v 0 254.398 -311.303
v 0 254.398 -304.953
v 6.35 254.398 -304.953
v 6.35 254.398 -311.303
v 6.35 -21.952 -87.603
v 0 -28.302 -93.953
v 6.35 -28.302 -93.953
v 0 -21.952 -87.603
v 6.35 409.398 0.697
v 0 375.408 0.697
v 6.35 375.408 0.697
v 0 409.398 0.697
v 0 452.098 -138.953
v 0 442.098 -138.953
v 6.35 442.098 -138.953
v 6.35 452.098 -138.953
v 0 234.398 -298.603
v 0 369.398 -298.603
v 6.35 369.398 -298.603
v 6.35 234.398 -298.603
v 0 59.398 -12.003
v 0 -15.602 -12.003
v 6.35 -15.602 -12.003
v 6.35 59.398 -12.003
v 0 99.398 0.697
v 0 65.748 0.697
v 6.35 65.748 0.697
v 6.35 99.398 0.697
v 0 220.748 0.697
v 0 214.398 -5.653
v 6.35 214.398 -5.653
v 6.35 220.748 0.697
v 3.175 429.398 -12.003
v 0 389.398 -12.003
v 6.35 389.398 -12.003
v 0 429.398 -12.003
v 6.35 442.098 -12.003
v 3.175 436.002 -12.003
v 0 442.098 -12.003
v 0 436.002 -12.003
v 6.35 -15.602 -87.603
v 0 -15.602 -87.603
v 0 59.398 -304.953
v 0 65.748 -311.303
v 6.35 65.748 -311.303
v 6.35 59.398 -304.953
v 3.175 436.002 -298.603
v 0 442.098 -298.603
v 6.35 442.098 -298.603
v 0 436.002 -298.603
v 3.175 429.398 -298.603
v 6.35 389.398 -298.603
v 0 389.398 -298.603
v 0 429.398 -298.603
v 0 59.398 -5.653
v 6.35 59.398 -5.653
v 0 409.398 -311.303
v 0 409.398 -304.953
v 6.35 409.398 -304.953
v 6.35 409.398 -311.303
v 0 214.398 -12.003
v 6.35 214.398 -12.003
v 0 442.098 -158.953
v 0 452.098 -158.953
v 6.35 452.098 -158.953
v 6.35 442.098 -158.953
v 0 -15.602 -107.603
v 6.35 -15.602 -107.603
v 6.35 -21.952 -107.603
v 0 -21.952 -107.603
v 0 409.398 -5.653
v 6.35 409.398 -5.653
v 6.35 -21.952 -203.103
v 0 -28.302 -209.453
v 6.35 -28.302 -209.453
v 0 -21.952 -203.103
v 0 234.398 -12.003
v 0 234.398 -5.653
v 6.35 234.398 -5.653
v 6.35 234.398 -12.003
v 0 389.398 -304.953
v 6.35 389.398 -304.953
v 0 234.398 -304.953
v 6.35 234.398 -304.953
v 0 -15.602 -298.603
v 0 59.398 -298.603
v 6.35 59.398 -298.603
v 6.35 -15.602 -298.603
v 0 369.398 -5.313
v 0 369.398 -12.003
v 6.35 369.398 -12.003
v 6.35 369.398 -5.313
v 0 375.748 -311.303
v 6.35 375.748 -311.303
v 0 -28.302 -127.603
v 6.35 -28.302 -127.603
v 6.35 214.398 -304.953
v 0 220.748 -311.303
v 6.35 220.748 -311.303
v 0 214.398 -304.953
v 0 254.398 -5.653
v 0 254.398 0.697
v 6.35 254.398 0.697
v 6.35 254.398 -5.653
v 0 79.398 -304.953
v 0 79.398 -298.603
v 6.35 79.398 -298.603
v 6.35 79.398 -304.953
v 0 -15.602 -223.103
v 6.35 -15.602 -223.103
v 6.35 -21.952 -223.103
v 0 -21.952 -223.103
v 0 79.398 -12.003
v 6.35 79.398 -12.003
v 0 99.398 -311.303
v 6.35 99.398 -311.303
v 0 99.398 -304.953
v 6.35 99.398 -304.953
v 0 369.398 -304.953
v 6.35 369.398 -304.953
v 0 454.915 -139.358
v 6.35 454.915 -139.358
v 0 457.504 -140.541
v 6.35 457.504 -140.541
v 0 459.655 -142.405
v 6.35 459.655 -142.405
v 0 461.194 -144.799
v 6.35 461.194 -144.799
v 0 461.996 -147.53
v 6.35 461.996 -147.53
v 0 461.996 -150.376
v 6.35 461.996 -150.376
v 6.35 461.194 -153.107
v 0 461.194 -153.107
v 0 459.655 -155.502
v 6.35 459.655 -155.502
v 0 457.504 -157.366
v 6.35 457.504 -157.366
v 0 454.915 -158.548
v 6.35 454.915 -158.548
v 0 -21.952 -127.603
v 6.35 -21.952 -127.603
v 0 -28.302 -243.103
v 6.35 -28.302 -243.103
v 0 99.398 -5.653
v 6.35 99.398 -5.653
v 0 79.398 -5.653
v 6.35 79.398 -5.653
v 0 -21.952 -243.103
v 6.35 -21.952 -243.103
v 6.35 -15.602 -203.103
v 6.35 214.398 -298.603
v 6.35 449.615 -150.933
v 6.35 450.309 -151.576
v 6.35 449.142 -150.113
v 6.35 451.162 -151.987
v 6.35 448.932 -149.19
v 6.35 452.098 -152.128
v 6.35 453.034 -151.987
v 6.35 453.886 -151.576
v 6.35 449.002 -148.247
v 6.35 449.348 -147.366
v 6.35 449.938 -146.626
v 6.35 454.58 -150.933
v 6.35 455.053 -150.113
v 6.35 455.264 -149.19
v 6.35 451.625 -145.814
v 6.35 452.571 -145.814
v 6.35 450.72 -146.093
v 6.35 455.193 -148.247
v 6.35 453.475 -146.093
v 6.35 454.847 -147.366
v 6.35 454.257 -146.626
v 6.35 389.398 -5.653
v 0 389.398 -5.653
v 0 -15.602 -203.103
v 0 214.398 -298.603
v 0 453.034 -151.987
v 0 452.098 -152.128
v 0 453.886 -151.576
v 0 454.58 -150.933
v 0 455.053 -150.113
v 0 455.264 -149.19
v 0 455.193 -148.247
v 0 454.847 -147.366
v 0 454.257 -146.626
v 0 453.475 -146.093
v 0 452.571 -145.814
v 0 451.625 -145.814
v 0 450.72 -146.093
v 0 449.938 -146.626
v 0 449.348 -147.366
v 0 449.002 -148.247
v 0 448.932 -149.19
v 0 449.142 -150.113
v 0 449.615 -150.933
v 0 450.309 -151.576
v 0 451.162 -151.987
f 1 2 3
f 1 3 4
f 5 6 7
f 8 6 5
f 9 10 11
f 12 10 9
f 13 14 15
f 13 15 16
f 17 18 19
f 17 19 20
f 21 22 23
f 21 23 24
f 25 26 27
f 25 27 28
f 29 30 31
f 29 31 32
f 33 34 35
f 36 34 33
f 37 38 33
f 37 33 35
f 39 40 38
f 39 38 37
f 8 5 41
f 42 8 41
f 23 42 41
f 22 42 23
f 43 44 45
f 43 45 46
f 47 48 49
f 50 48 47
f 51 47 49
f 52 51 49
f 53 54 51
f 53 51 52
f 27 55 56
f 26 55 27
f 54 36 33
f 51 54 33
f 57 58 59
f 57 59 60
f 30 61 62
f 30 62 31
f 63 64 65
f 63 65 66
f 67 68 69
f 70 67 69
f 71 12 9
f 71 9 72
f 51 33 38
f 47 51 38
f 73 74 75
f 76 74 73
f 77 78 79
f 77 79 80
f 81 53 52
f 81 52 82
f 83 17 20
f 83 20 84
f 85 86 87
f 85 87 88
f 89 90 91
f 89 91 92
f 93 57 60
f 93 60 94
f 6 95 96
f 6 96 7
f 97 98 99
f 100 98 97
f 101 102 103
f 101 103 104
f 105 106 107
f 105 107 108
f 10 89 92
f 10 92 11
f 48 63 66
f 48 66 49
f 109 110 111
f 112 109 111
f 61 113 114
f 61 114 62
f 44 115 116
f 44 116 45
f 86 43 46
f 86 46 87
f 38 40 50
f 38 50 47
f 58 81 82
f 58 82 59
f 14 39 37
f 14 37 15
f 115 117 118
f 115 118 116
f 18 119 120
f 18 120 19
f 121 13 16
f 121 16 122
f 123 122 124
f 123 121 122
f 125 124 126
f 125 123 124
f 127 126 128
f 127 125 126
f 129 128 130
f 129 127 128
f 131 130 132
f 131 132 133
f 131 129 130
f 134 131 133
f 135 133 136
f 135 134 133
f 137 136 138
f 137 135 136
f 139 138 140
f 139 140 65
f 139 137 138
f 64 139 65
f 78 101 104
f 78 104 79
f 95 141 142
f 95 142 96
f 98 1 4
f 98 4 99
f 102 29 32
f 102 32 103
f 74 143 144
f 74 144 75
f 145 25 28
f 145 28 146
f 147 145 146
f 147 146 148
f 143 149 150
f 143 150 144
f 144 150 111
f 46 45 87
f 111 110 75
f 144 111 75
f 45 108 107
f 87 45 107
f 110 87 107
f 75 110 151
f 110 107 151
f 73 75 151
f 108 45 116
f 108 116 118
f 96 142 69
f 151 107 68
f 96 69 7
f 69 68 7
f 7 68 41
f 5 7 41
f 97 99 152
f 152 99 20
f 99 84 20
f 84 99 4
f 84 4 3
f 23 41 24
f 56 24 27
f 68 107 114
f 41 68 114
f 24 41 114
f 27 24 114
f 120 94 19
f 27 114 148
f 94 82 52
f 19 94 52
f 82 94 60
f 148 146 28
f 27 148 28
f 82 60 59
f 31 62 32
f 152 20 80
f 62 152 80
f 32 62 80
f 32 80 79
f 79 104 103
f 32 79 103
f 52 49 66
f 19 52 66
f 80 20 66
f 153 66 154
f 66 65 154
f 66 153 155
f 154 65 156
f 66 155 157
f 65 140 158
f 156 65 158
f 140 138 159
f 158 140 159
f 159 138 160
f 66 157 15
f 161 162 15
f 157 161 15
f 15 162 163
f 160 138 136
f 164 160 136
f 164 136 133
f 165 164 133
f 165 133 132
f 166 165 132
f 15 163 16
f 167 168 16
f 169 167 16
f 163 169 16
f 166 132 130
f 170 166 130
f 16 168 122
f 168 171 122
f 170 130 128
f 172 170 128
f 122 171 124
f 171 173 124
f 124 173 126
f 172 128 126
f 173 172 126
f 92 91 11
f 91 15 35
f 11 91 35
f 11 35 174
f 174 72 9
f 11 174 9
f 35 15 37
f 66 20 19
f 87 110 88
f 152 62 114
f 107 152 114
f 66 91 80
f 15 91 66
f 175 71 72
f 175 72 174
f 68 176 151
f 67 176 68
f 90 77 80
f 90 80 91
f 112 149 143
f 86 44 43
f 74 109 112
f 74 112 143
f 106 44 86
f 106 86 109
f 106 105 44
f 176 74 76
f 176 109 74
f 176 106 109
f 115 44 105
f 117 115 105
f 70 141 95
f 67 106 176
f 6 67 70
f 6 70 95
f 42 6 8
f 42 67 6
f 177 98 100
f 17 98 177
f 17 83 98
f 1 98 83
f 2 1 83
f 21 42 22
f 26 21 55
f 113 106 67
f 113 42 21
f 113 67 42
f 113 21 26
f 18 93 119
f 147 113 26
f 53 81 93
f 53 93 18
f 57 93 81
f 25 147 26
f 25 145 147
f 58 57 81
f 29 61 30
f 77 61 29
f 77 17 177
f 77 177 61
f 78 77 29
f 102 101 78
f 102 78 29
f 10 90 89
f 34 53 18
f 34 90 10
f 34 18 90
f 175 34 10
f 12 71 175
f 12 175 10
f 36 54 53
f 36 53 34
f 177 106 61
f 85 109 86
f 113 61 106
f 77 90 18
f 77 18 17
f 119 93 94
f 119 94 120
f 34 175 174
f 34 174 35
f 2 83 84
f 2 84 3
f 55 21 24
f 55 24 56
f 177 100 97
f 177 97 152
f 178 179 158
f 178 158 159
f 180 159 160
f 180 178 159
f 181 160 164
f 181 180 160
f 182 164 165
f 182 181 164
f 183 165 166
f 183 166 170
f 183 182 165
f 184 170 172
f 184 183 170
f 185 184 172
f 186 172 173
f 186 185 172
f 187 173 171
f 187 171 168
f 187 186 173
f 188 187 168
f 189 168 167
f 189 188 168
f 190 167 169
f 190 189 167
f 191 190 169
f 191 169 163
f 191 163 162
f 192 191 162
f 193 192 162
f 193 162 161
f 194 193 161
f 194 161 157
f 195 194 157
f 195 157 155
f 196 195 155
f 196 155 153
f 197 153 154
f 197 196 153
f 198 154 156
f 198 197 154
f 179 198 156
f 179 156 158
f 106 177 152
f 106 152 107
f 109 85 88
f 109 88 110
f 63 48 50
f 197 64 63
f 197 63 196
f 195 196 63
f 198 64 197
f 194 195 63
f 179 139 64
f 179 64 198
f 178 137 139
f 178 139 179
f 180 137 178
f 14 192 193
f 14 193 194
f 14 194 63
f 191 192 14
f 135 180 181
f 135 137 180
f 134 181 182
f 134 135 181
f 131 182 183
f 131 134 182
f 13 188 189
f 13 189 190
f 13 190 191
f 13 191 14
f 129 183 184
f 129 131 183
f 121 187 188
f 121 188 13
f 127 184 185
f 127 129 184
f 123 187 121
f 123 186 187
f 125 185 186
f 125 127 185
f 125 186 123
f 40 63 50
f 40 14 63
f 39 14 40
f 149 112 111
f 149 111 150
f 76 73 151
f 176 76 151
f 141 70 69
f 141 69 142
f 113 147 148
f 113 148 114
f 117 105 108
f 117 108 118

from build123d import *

# Parameters (mm, degrees)
SKETCH2_R           = 3.175
BOSS_EXTRUDE1_DEPTH = 6.35
SKETCH3_W           = 3.175
SKETCH3_H           = 6.604
CUT_EXTRUDE1_DEPTH  = 551.59524986


with BuildPart() as part:
    # Sketch2 → Boss-Extrude1 (new body)
    with BuildSketch(Plane(origin=(0, 0, 0), x_dir=(0, 0, -1), z_dir=(1, 0, 0))):
        with BuildLine():
            Line((12.003150763, 442.097734975), (138.953150763, 442.097734975))
            Line((138.953150763, 442.097734975), (138.953150763, 452.097734975))
            ThreePointArc((138.953150763, 452.097734975), (148.953150763, 462.097734975), (158.953150763, 452.097734975))
            Line((158.953150763, 452.097734975), (158.953150763, 442.097734975))
            Line((158.953150763, 442.097734975), (298.603150763, 442.097734975))
            Line((298.603150763, 442.097734975), (298.603150763, 389.397734975))
            Line((298.603150763, 389.397734975), (304.953150763, 389.397734975))
            Line((304.953150763, 389.397734975), (304.953150763, 409.397734975))
            Line((304.953150763, 409.397734975), (311.303150763, 409.397734975))
            Line((311.303150763, 409.397734975), (311.303150763, 375.747734975))
            Line((311.303150763, 375.747734975), (304.953150763, 369.397734975))
            Line((304.953150763, 369.397734975), (298.603150763, 369.397734975))
            Line((298.603150763, 369.397734975), (298.603150763, 234.397734975))
            Line((298.603150763, 234.397734975), (304.953150763, 234.397734975))
            Line((304.953150763, 234.397734975), (304.953150763, 254.397734975))
            Line((304.953150763, 254.397734975), (311.303150763, 254.397734975))
            Line((311.303150763, 254.397734975), (311.303150763, 220.747734975))
            Line((311.303150763, 220.747734975), (304.953150763, 214.397734975))
            Line((304.953150763, 214.397734975), (298.603150763, 214.397734975))
            Line((298.603150763, 214.397734975), (298.603150763, 79.397734975))
            Line((298.603150763, 79.397734975), (304.953150763, 79.397734975))
            Line((304.953150763, 79.397734975), (304.953150763, 99.397734975))
            Line((304.953150763, 99.397734975), (311.303150763, 99.397734975))
            Line((311.303150763, 99.397734975), (311.303150763, 65.747734975))
            Line((311.303150763, 65.747734975), (304.953150763, 59.397734975))
            Line((304.953150763, 59.397734975), (298.603150763, 59.397734975))
            Line((298.603150763, 59.397734975), (298.603150763, -15.602265025))
            Line((298.603150763, -15.602265025), (223.103150763, -15.602265025))
            Line((223.103150763, -15.602265025), (223.103150763, -21.952265025))
            Line((223.103150763, -21.952265025), (243.103150763, -21.952265025))
            Line((243.103150763, -21.952265025), (243.103150763, -28.302265025))
            Line((243.103150763, -28.302265025), (209.453150763, -28.302265025))
            Line((209.453150763, -28.302265025), (203.103150763, -21.952265025))
            Line((203.103150763, -21.952265025), (203.103150763, -15.602265025))
            Line((203.103150763, -15.602265025), (107.603150763, -15.602265025))
            Line((107.603150763, -15.602265025), (107.603150763, -21.952265025))
            Line((107.603150763, -21.952265025), (127.603150763, -21.952265025))
            Line((127.603150763, -21.952265025), (127.603150763, -28.302265025))
            Line((127.603150763, -28.302265025), (93.953150763, -28.302265025))
            Line((93.953150763, -28.302265025), (87.603150763, -21.952265025))
            Line((87.603150763, -21.952265025), (87.603150763, -15.602265025))
            Line((87.603150763, -15.602265025), (12.003150763, -15.602265025))
            Line((12.003150763, -15.602265025), (12.003150763, 59.397734975))
            Line((12.003150763, 59.397734975), (5.653150763, 59.397734975))
            Line((5.653150763, 59.397734975), (-0.696849237, 65.747734975))
            Line((-0.696849237, 65.747734975), (-0.696849237, 99.397734975))
            Line((-0.696849237, 99.397734975), (5.653150763, 99.397734975))
            Line((5.653150763, 99.397734975), (5.653150763, 79.397734975))
            Line((5.653150763, 79.397734975), (12.003150763, 79.397734975))
            Line((12.003150763, 79.397734975), (12.003150763, 214.366115656))
            Line((12.003150763, 214.366115656), (12.003150763, 214.397734975))
            Line((12.003150763, 214.397734975), (5.653150763, 214.397734975))
            Line((5.653150763, 214.397734975), (-0.696849237, 220.747734975))
            Line((-0.696849237, 220.747734975), (-0.696849237, 254.397734975))
            Line((-0.696849237, 254.397734975), (5.653150763, 254.397734975))
            Line((5.653150763, 254.397734975), (5.653150763, 234.397734975))
            Line((5.653150763, 234.397734975), (12.003150763, 234.397734975))
            Line((12.003150763, 234.397734975), (12.003150763, 369.397734975))
            Line((12.003150763, 369.397734975), (5.313181696, 369.397734975))
            Line((5.313181696, 369.397734975), (-0.696849237, 375.407765908))
            Line((-0.696849237, 375.407765908), (-0.696849237, 409.397734975))
            Line((-0.696849237, 409.397734975), (5.653150763, 409.397734975))
            Line((5.653150763, 409.397734975), (5.653150763, 389.397734975))
            Line((5.653150763, 389.397734975), (12.003150763, 389.397734975))
            Line((12.003150763, 389.397734975), (12.003150763, 442.097734975))
        make_face()
        with Locations((148.953150763, 452.097734975)):
            Circle(SKETCH2_R, mode=Mode.SUBTRACT)
    extrude(amount=BOSS_EXTRUDE1_DEPTH)

    # Sketch3 → Cut-Extrude1 (cut, through all)
    with BuildSketch(Plane.XY.offset(-12.003150763)):
        with Locations((1.5875, 432.699734975)):
            Rectangle(SKETCH3_W, SKETCH3_H)
    extrude(amount=-CUT_EXTRUDE1_DEPTH, mode=Mode.SUBTRACT)


solid = part.part
